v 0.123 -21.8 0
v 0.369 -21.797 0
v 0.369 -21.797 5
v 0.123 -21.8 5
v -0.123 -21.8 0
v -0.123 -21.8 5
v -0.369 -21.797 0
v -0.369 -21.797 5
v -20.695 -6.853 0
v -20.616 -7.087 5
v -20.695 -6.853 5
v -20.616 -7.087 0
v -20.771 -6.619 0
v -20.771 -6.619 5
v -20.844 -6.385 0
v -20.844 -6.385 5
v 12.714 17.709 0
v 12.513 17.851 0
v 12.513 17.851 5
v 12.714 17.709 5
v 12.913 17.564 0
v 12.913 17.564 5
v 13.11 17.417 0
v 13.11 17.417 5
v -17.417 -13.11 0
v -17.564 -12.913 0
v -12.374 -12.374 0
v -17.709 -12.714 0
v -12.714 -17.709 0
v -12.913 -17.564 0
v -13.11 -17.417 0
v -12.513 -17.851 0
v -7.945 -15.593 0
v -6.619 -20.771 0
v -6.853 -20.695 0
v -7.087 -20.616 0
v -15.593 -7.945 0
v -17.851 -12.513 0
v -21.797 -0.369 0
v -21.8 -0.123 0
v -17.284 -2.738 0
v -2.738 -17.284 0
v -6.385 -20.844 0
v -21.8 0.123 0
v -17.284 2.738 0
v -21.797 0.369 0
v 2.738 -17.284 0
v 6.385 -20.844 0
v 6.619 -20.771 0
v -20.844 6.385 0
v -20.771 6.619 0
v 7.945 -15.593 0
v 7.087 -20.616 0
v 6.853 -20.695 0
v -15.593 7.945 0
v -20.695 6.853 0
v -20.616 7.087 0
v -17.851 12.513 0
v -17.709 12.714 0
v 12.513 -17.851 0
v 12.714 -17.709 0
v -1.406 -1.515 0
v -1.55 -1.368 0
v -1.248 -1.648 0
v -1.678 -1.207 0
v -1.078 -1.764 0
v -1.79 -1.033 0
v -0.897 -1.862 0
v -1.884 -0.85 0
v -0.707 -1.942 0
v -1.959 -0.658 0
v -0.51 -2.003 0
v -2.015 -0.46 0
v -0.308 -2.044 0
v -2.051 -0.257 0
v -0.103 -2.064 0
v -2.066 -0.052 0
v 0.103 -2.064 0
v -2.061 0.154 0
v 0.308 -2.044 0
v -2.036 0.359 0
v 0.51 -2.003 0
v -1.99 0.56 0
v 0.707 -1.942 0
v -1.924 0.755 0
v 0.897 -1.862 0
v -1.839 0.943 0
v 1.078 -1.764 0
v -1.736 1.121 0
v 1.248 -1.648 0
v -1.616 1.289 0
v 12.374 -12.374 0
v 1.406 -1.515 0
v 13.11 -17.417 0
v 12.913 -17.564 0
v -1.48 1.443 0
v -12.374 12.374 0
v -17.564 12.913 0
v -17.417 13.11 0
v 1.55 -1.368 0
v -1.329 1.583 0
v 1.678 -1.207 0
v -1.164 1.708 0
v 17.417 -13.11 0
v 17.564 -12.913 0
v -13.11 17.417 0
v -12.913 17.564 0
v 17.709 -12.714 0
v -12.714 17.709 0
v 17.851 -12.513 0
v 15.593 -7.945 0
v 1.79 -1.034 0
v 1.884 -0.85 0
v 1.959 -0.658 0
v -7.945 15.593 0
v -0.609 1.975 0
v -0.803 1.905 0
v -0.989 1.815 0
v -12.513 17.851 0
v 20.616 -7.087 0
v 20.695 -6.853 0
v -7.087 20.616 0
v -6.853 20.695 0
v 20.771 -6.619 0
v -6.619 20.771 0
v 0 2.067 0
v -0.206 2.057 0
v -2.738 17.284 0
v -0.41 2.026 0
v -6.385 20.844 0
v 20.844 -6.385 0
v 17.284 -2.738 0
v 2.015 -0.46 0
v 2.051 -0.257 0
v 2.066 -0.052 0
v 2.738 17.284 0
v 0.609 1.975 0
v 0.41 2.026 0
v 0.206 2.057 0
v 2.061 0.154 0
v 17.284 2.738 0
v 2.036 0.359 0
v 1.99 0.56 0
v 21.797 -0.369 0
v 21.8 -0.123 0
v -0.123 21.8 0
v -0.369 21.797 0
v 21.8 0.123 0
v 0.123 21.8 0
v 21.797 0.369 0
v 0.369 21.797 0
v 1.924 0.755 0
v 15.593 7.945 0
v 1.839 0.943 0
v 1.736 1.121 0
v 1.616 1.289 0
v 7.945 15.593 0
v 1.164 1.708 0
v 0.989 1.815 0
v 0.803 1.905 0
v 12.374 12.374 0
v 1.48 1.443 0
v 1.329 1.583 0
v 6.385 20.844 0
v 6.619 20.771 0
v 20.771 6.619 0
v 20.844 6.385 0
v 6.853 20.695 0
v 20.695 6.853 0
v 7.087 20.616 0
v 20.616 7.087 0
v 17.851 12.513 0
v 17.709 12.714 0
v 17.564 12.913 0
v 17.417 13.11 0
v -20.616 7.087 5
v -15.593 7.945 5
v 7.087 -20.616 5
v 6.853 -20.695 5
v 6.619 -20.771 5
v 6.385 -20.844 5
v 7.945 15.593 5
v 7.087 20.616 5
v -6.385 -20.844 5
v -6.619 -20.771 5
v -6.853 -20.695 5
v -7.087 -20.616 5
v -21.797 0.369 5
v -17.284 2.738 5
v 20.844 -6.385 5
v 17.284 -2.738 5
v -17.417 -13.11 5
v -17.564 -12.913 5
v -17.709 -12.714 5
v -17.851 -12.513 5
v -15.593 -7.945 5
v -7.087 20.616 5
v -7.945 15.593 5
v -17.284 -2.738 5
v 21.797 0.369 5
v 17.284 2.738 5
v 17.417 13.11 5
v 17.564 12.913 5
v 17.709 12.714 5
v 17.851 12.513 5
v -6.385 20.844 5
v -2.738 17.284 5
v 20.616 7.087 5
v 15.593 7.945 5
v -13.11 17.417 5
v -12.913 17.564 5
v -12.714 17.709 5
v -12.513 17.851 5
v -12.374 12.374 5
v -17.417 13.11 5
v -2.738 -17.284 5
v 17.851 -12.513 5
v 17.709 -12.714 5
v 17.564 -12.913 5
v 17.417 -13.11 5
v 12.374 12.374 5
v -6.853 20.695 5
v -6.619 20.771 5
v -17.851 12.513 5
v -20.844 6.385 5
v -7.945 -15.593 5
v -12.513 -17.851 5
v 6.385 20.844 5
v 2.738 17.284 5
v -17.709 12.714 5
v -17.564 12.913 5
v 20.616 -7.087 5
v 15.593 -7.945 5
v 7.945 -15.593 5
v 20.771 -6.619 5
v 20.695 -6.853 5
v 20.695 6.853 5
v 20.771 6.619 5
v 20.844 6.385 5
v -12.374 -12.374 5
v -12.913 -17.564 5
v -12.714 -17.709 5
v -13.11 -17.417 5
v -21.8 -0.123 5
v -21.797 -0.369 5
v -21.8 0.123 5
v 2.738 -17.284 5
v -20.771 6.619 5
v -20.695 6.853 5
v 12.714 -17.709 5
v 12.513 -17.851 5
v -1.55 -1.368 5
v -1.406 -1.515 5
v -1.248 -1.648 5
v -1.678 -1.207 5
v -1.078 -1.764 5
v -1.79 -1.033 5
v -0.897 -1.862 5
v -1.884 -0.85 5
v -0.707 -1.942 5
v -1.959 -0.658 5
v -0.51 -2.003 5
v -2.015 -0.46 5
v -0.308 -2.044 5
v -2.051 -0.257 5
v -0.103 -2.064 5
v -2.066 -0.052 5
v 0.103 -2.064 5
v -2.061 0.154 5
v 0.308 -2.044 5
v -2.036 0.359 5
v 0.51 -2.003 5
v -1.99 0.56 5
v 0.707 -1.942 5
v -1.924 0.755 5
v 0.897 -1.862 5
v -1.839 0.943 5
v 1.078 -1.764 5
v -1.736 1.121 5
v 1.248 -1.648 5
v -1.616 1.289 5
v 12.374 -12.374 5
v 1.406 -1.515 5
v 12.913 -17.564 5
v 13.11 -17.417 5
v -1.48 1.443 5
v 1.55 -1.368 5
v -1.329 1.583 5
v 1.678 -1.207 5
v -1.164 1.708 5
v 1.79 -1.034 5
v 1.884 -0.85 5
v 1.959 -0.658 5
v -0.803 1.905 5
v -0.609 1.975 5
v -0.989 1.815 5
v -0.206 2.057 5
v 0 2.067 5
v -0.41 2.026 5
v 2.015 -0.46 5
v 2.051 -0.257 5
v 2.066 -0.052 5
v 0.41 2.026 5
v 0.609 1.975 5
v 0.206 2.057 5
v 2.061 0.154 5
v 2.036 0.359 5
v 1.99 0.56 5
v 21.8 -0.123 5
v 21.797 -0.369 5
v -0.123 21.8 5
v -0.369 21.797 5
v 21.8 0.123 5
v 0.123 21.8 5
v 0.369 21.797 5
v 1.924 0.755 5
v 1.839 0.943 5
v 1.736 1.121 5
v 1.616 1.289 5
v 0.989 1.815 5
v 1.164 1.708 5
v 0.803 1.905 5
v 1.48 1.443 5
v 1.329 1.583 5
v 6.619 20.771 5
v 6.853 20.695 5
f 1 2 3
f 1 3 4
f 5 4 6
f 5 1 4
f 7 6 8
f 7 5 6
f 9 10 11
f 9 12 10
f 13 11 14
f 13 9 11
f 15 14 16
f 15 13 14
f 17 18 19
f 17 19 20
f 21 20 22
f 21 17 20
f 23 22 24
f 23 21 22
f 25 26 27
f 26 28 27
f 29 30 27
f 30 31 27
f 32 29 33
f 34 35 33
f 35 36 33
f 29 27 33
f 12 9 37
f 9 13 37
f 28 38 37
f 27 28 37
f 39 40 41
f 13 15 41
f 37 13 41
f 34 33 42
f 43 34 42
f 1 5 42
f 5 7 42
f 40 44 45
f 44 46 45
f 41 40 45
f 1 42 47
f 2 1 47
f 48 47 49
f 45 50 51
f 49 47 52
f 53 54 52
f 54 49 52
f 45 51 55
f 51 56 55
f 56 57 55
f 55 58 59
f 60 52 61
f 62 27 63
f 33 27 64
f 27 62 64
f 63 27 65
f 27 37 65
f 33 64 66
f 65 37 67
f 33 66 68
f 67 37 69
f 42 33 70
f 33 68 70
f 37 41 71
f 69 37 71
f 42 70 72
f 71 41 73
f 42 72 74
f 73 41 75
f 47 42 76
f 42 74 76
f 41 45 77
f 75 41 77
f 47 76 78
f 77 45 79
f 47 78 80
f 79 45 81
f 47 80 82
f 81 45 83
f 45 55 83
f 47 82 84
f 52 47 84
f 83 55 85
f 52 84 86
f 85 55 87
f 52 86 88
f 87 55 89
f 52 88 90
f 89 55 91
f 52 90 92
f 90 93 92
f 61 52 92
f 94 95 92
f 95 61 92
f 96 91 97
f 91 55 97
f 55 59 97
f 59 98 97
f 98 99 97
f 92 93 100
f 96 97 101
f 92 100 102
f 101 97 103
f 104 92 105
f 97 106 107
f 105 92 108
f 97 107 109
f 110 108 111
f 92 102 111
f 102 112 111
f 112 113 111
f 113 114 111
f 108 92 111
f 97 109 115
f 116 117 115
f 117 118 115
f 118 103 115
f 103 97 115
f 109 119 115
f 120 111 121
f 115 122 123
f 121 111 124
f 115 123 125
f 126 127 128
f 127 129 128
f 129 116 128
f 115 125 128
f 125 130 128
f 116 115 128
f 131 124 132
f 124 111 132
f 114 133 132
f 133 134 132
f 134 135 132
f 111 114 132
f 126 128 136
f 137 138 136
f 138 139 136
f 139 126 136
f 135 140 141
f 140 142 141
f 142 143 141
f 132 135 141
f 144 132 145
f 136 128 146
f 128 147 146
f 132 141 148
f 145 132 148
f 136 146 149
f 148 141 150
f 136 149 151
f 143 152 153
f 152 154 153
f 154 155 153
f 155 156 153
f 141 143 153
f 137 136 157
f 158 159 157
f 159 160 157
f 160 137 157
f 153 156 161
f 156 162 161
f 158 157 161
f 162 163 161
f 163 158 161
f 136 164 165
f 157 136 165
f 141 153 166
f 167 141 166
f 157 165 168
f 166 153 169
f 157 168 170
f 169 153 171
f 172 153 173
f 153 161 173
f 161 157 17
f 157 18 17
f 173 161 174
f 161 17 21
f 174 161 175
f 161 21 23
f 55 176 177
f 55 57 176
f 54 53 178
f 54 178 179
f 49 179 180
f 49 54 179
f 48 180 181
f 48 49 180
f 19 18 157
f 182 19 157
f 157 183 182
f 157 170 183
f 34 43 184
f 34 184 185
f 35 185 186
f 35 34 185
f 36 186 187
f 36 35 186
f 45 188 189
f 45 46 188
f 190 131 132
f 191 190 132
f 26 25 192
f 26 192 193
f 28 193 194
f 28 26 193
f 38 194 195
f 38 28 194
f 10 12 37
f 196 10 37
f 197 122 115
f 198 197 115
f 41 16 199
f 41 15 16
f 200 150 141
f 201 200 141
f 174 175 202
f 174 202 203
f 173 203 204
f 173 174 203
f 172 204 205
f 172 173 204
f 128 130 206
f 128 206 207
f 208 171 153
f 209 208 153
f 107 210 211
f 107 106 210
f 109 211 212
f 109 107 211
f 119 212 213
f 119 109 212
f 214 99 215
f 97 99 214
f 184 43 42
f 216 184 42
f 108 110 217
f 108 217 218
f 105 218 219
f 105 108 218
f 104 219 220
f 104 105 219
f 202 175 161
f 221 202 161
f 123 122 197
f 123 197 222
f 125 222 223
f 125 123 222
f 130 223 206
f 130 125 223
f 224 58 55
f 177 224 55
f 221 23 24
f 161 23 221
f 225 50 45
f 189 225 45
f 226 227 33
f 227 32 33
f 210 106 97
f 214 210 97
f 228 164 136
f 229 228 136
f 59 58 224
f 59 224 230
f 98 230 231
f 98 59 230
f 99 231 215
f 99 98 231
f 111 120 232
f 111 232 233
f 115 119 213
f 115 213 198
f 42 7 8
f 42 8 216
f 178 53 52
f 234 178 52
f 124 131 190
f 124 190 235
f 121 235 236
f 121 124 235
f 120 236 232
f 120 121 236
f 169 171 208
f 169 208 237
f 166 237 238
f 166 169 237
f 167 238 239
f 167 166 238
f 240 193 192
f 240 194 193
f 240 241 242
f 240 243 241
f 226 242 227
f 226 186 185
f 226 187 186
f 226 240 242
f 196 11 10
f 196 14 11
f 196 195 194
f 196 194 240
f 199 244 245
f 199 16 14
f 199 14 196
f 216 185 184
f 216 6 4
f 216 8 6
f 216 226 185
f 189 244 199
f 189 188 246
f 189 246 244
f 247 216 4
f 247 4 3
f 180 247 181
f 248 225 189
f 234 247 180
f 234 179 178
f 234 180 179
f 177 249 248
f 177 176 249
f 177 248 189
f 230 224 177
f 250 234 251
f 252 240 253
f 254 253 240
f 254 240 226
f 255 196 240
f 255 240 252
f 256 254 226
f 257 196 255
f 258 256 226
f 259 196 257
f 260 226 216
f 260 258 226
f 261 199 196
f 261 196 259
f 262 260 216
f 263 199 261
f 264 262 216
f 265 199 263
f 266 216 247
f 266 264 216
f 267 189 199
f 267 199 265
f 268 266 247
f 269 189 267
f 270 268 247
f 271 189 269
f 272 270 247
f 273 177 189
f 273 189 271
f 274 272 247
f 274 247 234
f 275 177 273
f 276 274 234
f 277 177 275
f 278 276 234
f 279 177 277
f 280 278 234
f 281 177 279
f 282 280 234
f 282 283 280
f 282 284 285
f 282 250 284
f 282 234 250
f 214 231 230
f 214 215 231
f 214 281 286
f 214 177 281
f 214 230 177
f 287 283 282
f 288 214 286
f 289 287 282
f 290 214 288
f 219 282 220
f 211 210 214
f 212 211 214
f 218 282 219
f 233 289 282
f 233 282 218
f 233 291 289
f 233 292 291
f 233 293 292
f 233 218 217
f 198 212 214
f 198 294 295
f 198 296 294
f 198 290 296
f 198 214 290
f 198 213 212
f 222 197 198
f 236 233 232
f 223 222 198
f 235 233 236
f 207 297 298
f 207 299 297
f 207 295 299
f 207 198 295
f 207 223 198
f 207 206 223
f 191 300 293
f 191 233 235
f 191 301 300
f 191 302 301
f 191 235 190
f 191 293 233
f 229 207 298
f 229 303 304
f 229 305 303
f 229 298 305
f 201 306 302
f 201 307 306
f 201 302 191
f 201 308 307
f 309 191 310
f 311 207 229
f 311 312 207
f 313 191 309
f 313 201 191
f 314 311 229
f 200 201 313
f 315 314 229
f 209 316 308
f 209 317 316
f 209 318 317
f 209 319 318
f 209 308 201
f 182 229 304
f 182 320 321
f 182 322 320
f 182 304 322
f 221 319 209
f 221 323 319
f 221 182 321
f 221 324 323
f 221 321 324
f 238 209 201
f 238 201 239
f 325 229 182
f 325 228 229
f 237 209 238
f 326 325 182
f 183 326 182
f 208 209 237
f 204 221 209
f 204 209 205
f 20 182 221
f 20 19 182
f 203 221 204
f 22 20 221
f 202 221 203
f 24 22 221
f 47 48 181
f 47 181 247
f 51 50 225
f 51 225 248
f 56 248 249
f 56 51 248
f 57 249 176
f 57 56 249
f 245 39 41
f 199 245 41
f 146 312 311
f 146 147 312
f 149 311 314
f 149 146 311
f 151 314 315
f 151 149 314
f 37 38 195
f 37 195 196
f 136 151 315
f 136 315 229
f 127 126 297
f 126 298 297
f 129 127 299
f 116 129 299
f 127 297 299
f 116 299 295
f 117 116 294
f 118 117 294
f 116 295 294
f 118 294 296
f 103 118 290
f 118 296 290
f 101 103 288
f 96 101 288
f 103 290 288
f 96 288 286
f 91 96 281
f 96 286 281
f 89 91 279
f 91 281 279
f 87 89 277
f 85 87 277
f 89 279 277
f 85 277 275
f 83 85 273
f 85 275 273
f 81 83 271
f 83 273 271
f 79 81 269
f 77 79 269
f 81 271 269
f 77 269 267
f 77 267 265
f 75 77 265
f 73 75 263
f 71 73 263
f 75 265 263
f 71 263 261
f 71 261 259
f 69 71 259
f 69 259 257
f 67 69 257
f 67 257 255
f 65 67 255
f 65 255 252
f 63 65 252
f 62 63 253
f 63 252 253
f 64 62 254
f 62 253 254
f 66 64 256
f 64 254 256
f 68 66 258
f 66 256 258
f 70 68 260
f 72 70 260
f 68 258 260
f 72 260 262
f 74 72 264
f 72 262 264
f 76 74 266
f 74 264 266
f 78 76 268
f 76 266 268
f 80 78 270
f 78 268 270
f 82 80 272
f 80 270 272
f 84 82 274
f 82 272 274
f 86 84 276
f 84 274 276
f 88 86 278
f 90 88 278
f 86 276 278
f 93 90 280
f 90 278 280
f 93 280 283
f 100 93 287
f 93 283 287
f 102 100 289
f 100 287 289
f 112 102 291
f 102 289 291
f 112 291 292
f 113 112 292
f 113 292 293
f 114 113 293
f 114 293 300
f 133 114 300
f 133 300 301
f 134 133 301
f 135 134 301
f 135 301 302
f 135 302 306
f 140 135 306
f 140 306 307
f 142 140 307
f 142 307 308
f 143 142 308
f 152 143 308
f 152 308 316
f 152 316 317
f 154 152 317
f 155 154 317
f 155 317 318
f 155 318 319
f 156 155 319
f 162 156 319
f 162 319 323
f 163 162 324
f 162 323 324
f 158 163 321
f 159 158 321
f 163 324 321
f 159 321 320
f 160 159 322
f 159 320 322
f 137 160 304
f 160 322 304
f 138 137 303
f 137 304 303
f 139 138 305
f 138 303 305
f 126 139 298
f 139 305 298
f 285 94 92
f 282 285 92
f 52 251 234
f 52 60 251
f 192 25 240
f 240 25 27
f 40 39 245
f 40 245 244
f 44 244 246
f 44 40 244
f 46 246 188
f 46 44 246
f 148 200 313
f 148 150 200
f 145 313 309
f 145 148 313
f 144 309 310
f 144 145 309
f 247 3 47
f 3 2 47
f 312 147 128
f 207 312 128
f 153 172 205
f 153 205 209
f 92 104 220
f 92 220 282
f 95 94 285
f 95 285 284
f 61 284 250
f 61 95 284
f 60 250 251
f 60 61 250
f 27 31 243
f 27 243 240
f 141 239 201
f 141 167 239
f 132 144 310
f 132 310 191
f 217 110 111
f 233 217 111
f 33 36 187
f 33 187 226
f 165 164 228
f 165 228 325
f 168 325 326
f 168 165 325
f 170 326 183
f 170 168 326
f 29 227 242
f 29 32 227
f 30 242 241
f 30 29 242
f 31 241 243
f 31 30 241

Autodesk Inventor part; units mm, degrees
ref_plane "YZ Plane" through (0, 0, 0) normal (1, 0, 0) x (0, 1, 0)
ref_plane "XZ Plane" through (0, 0, 0) normal (0, 1, 0) x (-1, 0, 0)
ref_plane "XY Plane" through (0, 0, 0) normal (0, 0, 1) x (1, 0, 0)
sketch "Sketch1" plane through (0, 0, 0) normal (0, 0, 1) x (1, 0, 0)
  circle A0 centre (0, 0) radius 22.5
  circle A1 centre (0, 0) radius 17.5
  line L0 (0, 0) -> (0, 22.5)
  line L1 (0, 22.5) -> (0, 0)
  line L2 (6.9529, 21.3988) -> (0, 0)
  line L3 (0, 0) -> (2.7376, 17.2845)
  line L4 (0, 22.5) -> (2.7376, 17.2845)
  line L5 (6.9529, 21.3988) -> (2.7376, 17.2845)
  line L6 (-6.9529, 21.3988) -> (-2.7376, 17.2845)
  line L7 (0, 22.5) -> (-2.7376, 17.2845)
  line L8 (-13.2252, 18.2029) -> (-7.9448, 15.5926)
  line L9 (-6.9529, 21.3988) -> (-7.9448, 15.5926)
  line L10 (-18.2029, 13.2252) -> (-12.3744, 12.3744)
  line L11 (-13.2252, 18.2029) -> (-12.3744, 12.3744)
  line L12 (-21.3988, 6.9529) -> (-15.5926, 7.9448)
  line L13 (-18.2029, 13.2252) -> (-15.5926, 7.9448)
  line L14 (-22.5, 0) -> (-17.2845, 2.7376)
  line L15 (-21.3988, 6.9529) -> (-17.2845, 2.7376)
  line L16 (-21.3988, -6.9529) -> (-17.2845, -2.7376)
  line L17 (-22.5, 0) -> (-17.2845, -2.7376)
  line L18 (-18.2029, -13.2252) -> (-15.5926, -7.9448)
  line L19 (-21.3988, -6.9529) -> (-15.5926, -7.9448)
  line L20 (-13.2252, -18.2029) -> (-12.3744, -12.3744)
  line L21 (-18.2029, -13.2252) -> (-12.3744, -12.3744)
  line L22 (-6.9529, -21.3988) -> (-7.9448, -15.5926)
  line L23 (-13.2252, -18.2029) -> (-7.9448, -15.5926)
  line L24 (0, -22.5) -> (-2.7376, -17.2845)
  line L25 (-6.9529, -21.3988) -> (-2.7376, -17.2845)
  line L26 (6.9529, -21.3988) -> (2.7376, -17.2845)
  line L27 (0, -22.5) -> (2.7376, -17.2845)
  line L28 (13.2252, -18.2029) -> (7.9448, -15.5926)
  line L29 (6.9529, -21.3988) -> (7.9448, -15.5926)
  line L30 (18.2029, -13.2252) -> (12.3744, -12.3744)
  line L31 (13.2252, -18.2029) -> (12.3744, -12.3744)
  line L32 (21.3988, -6.9529) -> (15.5926, -7.9448)
  line L33 (18.2029, -13.2252) -> (15.5926, -7.9448)
  line L34 (22.5, 0) -> (17.2845, -2.7376)
  line L35 (21.3988, -6.9529) -> (17.2845, -2.7376)
  line L36 (21.3988, 6.9529) -> (17.2845, 2.7376)
  line L37 (22.5, 0) -> (17.2845, 2.7376)
  line L38 (18.2029, 13.2252) -> (15.5926, 7.9448)
  line L39 (21.3988, 6.9529) -> (15.5926, 7.9448)
  line L40 (13.2252, 18.2029) -> (12.3744, 12.3744)
  line L41 (18.2029, 13.2252) -> (12.3744, 12.3744)
  line L42 (6.9529, 21.3988) -> (7.9448, 15.5926)
  line L43 (13.2252, 18.2029) -> (7.9448, 15.5926)
  point P0 (-22.5, 0)
  point P1 (-6.9529, -21.3988)
  point P2 (0, -22.5)
  point P3 (6.9529, -21.3988)
  point P4 (13.2252, -18.2029)
  point P5 (18.2029, -13.2252)
  point P6 (21.3988, -6.9529)
  point P7 (22.5, 0)
  point P8 (21.3988, 6.9529)
  point P9 (18.2029, 13.2252)
  point P10 (15.5926, 7.9448)
  point P11 (12.3744, 12.3744)
  point P12 (7.9448, 15.5926)
  point P13 (-21.3988, 6.9529)
  point P14 (-22.5, 0)
  point P15 (-21.3988, -6.9529)
  point P16 (-18.2029, -13.2252)
  point P17 (-13.2252, -18.2029)
  point P18 (-6.9529, -21.3988)
  point P19 (0, -22.5)
  point P20 (6.9529, -21.3988)
  point P21 (13.2252, -18.2029)
  point P22 (22.5, 0)
  point P23 (18.2029, 13.2252)
  point P24 (13.2252, 18.2029)
  dimension "d4" = 45
  dimension "d28" = 5
  dimension "d2" = 360
  dimension "d6" = 18
  dimension "d7" = 9
  dimension "d10" = 360
  dimension "d14" = 360
extrude "Extrusion1" add sketch "Sketch1" along normal blind 5 contours L34 A1 L37 | L36 A1 L39 | L32 A1 L35 | A1 L0 L2 | L38 A1 L41 | L30 A1 L33 | L40 A1 L43 | L28 A1 L31 | L42 A1 L2 | L2 A1 L5 | L26 A1 L29 | L4 A1 L0 | L0 A1 L7 | L2 L3 A1 | L3 L0 A1 | L24 A1 L27 | L6 A1 L9 | L22 A1 L25 | L8 A1 L11 | L20 A1 L23 | L10 A1 L13 | L18 A1 L21 | L12 A1 L15 | L16 A1 L19 | L14 A1 L17
sketch "Sketch2" plane through (0, 0, 0) normal (0, 0, -1) x (-1, 0, 0)
  line L0 (-2.7376, 17.2845) -> (0, 22.5) projected
  circle A0 centre (0, 0) radius 22.5
  circle A1 centre (0, 0) radius 21.8
  dimension "d18" = 0.7
extrude "Extrusion2" cut sketch "Sketch2" against normal blind 5
sketch "Sketch3" plane through (0, 0, 0) normal (0, 0, -1) x (-1, 0, 0)
  point P0 (0, 0)
hole "Hole1" at (0, 0, 0) direction (0, 0, 1) diameter 4.134 depth 14.2 tip angle 118
properties part number "Gear_Basic"
